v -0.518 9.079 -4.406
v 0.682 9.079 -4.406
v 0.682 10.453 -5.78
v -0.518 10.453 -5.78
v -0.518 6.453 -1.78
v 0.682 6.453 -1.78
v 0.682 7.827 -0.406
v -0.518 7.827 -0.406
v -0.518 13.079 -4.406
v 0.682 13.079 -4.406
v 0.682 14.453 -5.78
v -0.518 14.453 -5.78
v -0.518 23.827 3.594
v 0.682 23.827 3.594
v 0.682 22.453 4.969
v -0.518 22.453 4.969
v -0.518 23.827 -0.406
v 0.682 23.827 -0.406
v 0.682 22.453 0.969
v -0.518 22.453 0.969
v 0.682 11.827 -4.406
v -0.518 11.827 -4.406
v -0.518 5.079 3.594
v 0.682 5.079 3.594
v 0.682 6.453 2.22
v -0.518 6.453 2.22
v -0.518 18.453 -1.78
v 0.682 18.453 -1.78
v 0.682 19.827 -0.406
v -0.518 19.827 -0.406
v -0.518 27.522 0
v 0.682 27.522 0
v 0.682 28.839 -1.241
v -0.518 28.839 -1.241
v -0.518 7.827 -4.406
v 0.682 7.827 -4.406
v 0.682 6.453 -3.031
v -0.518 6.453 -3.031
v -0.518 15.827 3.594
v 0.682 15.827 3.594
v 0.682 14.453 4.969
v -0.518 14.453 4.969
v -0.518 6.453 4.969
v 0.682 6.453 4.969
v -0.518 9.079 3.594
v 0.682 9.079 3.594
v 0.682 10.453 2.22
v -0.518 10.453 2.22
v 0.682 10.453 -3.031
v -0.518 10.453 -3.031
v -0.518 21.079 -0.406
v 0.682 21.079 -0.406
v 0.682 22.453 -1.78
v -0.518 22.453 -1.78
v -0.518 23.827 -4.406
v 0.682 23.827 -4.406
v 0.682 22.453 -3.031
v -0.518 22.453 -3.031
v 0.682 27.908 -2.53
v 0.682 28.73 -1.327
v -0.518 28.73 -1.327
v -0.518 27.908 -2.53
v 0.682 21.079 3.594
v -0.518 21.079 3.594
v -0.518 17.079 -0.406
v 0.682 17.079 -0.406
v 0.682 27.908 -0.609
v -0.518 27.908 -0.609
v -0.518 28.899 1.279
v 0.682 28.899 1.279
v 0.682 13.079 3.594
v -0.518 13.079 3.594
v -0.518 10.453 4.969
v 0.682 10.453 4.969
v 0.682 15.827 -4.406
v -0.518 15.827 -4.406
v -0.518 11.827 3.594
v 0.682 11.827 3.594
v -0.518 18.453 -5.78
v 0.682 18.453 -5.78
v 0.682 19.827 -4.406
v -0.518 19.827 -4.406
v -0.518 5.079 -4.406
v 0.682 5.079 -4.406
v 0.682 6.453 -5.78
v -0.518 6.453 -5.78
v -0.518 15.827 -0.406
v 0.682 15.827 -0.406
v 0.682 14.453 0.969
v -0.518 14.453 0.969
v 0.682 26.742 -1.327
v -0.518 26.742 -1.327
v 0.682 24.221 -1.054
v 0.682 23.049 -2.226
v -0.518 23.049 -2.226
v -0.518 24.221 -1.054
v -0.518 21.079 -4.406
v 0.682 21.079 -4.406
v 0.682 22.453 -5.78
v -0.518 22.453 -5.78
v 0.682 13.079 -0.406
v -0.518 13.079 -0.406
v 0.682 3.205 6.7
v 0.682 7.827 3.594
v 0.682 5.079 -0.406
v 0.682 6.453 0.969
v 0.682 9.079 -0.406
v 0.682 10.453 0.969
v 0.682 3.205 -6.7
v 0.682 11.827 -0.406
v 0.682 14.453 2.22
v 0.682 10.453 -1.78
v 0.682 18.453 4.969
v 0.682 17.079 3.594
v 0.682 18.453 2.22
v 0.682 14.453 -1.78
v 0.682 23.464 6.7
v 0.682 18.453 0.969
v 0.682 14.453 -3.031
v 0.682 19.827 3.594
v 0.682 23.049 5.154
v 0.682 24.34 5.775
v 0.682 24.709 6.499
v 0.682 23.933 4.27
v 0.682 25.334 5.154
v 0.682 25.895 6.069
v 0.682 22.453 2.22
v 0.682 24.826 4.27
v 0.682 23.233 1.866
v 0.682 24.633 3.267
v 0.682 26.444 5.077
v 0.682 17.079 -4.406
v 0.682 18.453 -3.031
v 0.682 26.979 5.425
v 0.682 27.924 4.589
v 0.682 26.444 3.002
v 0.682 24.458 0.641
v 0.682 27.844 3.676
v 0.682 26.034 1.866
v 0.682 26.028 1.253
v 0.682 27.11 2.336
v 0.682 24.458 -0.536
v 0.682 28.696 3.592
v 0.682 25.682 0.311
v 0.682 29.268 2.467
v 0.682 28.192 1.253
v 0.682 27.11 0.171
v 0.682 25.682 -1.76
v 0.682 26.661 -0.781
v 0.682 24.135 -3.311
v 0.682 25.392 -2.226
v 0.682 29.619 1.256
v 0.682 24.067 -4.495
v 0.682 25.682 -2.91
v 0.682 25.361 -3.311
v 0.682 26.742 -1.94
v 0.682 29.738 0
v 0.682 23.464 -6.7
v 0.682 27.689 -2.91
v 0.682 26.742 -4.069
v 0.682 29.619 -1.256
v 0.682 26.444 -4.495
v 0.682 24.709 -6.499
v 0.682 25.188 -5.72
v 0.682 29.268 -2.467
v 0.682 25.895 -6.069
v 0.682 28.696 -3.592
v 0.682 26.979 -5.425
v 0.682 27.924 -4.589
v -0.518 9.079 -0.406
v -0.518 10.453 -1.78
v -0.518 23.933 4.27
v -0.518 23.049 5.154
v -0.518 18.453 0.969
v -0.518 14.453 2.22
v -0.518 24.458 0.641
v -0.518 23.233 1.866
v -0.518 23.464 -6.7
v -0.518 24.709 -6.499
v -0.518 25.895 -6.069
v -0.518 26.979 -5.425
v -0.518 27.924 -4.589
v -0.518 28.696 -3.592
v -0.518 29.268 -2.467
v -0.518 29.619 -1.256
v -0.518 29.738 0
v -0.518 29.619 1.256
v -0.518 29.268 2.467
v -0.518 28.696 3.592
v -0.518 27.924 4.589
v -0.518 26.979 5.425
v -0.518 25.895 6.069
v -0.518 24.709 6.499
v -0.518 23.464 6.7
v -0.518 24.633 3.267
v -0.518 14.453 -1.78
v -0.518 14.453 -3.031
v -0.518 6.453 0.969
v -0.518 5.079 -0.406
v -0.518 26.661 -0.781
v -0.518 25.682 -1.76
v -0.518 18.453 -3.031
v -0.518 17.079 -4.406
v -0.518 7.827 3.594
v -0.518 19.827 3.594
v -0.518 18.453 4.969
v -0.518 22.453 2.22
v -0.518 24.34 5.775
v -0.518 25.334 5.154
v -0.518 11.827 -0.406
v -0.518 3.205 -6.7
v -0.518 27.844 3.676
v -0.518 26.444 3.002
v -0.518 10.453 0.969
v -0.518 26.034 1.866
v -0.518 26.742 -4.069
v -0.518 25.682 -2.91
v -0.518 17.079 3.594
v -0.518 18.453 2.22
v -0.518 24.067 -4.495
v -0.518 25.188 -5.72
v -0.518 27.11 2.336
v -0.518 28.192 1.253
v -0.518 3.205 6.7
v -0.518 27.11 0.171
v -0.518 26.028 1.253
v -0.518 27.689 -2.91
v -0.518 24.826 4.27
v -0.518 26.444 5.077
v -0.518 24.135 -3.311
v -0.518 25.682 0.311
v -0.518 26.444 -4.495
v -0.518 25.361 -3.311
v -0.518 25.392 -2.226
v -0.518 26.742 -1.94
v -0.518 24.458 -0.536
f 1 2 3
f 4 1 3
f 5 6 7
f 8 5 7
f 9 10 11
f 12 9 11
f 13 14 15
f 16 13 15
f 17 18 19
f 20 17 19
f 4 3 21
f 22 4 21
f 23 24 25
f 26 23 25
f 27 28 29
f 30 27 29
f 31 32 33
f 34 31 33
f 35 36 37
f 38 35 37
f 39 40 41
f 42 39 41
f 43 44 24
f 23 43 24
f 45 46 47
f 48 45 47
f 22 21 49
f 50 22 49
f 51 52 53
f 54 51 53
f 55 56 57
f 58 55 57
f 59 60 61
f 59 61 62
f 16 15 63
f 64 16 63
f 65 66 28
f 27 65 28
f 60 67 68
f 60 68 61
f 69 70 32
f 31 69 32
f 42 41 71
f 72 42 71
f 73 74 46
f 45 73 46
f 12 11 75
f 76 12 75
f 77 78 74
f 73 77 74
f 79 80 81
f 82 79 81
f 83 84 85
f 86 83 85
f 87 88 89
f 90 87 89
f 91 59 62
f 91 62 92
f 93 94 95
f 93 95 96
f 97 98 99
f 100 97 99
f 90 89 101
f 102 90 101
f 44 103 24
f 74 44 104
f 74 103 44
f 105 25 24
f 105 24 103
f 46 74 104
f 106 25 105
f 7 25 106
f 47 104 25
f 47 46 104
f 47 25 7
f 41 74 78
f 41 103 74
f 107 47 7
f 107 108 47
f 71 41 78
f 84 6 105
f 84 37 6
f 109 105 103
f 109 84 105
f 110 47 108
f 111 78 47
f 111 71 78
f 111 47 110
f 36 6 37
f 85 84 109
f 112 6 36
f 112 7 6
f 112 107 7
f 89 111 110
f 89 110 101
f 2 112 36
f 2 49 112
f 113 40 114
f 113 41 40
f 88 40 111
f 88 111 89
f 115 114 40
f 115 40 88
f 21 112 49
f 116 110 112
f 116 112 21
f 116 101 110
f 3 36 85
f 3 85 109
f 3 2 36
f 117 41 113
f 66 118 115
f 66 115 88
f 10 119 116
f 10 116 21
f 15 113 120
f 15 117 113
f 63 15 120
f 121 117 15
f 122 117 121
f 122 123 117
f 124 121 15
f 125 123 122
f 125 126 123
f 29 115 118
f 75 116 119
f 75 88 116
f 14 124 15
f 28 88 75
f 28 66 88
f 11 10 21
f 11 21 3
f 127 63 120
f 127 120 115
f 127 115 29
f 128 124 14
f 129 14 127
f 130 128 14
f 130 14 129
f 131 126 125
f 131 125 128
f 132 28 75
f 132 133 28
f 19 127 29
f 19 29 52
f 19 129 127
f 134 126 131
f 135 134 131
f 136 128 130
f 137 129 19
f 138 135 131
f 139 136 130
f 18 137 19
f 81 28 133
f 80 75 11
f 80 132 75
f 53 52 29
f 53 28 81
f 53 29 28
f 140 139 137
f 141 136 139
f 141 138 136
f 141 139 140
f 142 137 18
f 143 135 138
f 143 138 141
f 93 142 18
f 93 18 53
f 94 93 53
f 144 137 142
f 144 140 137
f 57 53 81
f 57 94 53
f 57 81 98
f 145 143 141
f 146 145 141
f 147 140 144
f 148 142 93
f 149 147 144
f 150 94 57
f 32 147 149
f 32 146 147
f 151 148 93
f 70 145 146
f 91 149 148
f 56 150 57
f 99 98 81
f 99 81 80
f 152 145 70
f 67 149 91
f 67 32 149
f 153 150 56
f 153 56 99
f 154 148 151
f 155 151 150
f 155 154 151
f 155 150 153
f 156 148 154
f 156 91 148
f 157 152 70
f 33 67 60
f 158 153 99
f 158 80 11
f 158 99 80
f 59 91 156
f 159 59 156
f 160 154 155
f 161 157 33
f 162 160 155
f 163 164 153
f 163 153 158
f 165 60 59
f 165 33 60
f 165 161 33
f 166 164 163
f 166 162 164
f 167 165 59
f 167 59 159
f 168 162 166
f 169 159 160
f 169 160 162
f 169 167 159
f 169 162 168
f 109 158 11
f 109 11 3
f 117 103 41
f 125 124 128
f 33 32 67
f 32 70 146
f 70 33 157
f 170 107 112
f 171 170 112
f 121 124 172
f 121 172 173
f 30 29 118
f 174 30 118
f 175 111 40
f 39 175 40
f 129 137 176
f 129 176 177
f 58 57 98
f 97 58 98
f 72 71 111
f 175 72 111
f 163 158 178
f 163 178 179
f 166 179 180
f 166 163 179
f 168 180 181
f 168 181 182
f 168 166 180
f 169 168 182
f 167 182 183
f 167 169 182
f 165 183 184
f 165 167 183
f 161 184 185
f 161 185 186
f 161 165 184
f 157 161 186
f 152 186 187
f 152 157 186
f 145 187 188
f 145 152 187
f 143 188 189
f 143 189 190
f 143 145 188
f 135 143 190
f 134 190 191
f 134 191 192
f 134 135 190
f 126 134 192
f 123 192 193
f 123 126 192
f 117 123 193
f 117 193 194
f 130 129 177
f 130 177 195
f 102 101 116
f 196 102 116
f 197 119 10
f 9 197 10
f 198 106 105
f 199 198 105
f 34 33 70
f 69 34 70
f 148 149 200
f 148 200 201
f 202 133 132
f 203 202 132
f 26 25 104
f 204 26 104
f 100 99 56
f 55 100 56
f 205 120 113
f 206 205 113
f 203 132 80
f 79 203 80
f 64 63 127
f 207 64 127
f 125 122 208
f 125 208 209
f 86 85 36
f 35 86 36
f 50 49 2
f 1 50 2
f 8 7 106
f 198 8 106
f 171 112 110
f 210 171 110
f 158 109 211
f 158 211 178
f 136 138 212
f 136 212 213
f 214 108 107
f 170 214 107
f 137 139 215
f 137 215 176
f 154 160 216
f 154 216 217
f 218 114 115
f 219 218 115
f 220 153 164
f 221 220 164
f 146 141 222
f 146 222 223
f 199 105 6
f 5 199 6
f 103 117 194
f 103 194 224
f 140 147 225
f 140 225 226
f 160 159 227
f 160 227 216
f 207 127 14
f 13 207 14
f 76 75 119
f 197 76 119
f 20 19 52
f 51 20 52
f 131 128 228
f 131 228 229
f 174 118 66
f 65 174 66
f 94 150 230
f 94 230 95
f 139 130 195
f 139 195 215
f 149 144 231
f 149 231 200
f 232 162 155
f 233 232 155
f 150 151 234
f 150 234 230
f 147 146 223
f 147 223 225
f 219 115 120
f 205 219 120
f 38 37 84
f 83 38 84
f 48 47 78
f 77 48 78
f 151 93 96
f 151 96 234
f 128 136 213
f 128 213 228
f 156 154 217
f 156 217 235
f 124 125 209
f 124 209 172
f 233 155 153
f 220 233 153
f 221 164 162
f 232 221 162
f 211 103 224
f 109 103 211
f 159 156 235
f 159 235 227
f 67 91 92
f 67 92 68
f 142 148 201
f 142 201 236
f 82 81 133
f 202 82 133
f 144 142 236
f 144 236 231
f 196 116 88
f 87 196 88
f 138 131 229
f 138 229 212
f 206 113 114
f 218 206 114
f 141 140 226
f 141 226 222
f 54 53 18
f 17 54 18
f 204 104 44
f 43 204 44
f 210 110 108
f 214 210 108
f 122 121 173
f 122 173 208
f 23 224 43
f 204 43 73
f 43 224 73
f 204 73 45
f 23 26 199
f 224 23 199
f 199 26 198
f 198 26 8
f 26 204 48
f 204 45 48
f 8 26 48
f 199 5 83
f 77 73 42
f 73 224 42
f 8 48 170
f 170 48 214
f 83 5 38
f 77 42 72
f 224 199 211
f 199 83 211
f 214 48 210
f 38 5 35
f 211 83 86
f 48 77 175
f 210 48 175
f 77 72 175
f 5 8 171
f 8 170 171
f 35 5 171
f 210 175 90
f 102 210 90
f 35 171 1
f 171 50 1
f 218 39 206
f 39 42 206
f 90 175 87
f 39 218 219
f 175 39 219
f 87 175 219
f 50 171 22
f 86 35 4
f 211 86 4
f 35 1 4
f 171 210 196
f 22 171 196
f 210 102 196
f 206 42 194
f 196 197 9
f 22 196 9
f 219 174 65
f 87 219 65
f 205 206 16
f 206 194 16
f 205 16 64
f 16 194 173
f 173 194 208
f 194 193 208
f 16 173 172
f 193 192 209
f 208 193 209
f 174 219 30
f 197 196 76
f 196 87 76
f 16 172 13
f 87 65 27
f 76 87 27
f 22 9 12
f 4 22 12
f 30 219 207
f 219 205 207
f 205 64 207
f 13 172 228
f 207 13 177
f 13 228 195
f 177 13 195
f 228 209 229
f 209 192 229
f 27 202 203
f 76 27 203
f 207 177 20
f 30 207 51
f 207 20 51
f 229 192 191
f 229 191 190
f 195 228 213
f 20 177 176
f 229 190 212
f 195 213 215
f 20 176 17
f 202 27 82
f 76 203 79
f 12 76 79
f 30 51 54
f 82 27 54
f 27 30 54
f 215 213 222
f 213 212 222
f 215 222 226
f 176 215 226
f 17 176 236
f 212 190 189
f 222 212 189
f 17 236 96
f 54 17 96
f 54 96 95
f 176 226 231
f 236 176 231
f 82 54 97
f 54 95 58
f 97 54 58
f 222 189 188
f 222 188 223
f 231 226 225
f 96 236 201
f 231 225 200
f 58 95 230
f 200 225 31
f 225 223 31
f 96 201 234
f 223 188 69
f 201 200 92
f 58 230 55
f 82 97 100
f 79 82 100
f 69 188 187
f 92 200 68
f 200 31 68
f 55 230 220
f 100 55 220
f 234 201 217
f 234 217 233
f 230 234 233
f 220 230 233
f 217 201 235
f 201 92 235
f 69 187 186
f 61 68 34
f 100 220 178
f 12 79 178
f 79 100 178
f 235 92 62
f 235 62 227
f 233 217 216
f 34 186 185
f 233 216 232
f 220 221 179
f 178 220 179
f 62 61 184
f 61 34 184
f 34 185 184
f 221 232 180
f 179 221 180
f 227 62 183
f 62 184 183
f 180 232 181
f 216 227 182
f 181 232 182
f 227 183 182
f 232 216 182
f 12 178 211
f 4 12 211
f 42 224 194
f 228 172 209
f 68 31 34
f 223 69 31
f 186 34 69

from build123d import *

# Parameters (mm, degrees)
MAINBASESKETCH_W                 = 7.9
MAINBASESKETCH_H                 = 3.2
MAINBASEEXTRUDE_DEPTH            = 7.9
MAINBASESHELL_T                  = -1.2
SLIMYELLOWUNDEREXT_START         = -0.2
SLIMYELLOWUNDEREXT_DEPTH         = 2
SLIMYELLLOWUPPERCIRCLESKETCH_R   = 2.45
SLIMYELLLOWUPPERCIRCLESKETCH_R_2 = 2
SLIMYELLOWUPPERCIRCLE_DEPTH      = 1.6
MOVE_START                       = 3.2
MOVE_FACE2_OUTLINE_W             = 7.9
MOVE_FACE2_OUTLINE_H             = 15.8
MOVE_FACE2_OUTLINE_R             = 2
MOVE_FACE2_DEPTH                 = 27.8
MOVE_START_2                     = 31
MOVE_FACE2_2_OUTLINE_R           = 2.45
MOVE_FACE2_2_OUTLINE_R_2         = 2
MOVE_FACE2_2_DEPTH               = 1.6
FILLET25_R                       = 7.6
FILLET26_R                       = 7.6
CUT_EXTRUDE55_DEPTH              = 35.461282763
CUT_EXTRUDE57_REACH              = 34.748
SKETCH160_R                      = 0.75
BOSS_EXTRUDE20_DEPTH             = 3.5
BOSS_EXTRUDE22_DEPTH             = 1.2
CUT_EXTRUDE58_DEPTH              = 35.461282763
CUT_EXTRUDE59_DEPTH              = 31.506685799
CUT_EXTRUDE61_DEPTH              = 31.506685799
LPATTERN5_COUNT                  = 5
LPATTERN5_PITCH                  = 4
LPATTERN5_COUNT_DIR2             = 3
LPATTERN5_PITCH_DIR2             = 4
CUT_EXTRUDE62_DEPTH              = 31.506685799


# Read off the part's stored shape, not the designer's step: Move Face2
with BuildPart() as part:
    # MainBaseSketch → MainBaseExtrude (new, symmetric)
    with BuildSketch(Plane.XY):
        with Locations((4.631967213, 1.6)):
            Rectangle(MAINBASESKETCH_W, MAINBASESKETCH_H)
    extrude(amount=MAINBASEEXTRUDE_DEPTH, both=True)

    # MainBaseShell
    mainbaseshell_openings = [part.faces().sort_by_distance(p)[0] for p in [
        (4.631967213, 0, 0),
    ]]
    offset(amount=MAINBASESHELL_T, openings=mainbaseshell_openings, kind=Kind.INTERSECTION)

    # SlimYellowUnderExtSketch → SlimYellowUnderExt (add)
    with BuildSketch(Plane.XZ.offset(-2).offset(SLIMYELLOWUNDEREXT_START)):
        Polygon((1.881967213, 1.952811318), (1.881967213, 2.947188682), (2.384104441, 2.947188682), (2.882626102, 2.45), (2.384104441, 1.952811318), align=None)
        Polygon((6.381308324, 2.45), (6.879829986, 2.947188682), (7.381967213, 2.947188682), (7.381967213, 1.952811318), (6.879829986, 1.952811318), align=None)
        Polygon((1.881967213, -1.952811318), (2.384104441, -1.952811318), (2.882626102, -2.45), (2.384104441, -2.947188682), (1.881967213, -2.947188682), align=None)
        Polygon((7.381967213, -1.952811318), (7.381967213, -2.947188682), (6.879829986, -2.947188682), (6.381308324, -2.45), (6.879829986, -1.952811318), align=None)
    extrude(amount=SLIMYELLOWUNDEREXT_DEPTH)

    # SlimYelllowUpperCircleSketch → SlimYellowUpperCircle (add)
    with BuildSketch(Plane(origin=(0, 3.2, 0), x_dir=(1, 0, 0), z_dir=(0, 1, 0))):
        with Locations((4.647335619, 0)):
            Circle(SLIMYELLLOWUPPERCIRCLESKETCH_R)
        with Locations(Location((4.647335619, 0, 0), (0, 0, 270))):
            Circle(SLIMYELLLOWUPPERCIRCLESKETCH_R_2, mode=Mode.SUBTRACT)
    extrude(amount=SLIMYELLOWUPPERCIRCLE_DEPTH)

    # Move Face2 outline → Move Face2 (add)
    with BuildSketch(Plane(origin=(0, 0, 0), x_dir=(1, 0, 0), z_dir=(0, 1, 0)).offset(MOVE_START)):
        with Locations((4.631967213, 0)):
            Rectangle(MOVE_FACE2_OUTLINE_W, MOVE_FACE2_OUTLINE_H)
        with Locations((4.647335619, 0)):
            Circle(MOVE_FACE2_OUTLINE_R, mode=Mode.SUBTRACT)
    extrude(amount=MOVE_FACE2_DEPTH)

    # Move Face2 2 outline → Move Face2 2 (add)
    with BuildSketch(Plane(origin=(0, 0, 0), x_dir=(1, 0, 0), z_dir=(0, 1, 0)).offset(MOVE_START_2)):
        with Locations((4.647335619, 0)):
            Circle(MOVE_FACE2_2_OUTLINE_R)
        with Locations((4.647335619, 0)):
            Circle(MOVE_FACE2_2_OUTLINE_R_2, mode=Mode.SUBTRACT)
    extrude(amount=MOVE_FACE2_2_DEPTH)

    # Fillet25
    # the kernel refuses this fillet: 7.6 mm, written as the material it takes off along each edge
    with BuildSketch(Plane(origin=(0.681967213, 31, 7.9), x_dir=(0, 0, -1), z_dir=(1, 0, 0))) as fillet25_piece_1_section:
        with BuildLine():
            CenterArc((FILLET25_R, -FILLET25_R), FILLET25_R, 90, 90)
            Line((0, -FILLET25_R), (-FILLET25_R * 0.02, -FILLET25_R))
            Line((-FILLET25_R * 0.02, -FILLET25_R), (-FILLET25_R * 0.02, FILLET25_R * 0.02))
            Line((-FILLET25_R * 0.02, FILLET25_R * 0.02), (FILLET25_R, FILLET25_R * 0.02))
            Line((FILLET25_R, FILLET25_R * 0.02), (FILLET25_R, 0))
        make_face()
    fillet25_piece_1 = extrude(amount=7.9, mode=Mode.PRIVATE)
    fillet25_piece_1 = fillet25_piece_1 - Plane(origin=(4.647335619, 29.251763141, 0), x_dir=(1, 0, 0), z_dir=(0, -1, 0)) * Cylinder(2.45, 47, mode=Mode.PRIVATE)
    add(fillet25_piece_1, mode=Mode.SUBTRACT)

    # Fillet26
    # the kernel refuses this fillet: 7.6 mm, written as the material it takes off along each edge
    with BuildSketch(Plane(origin=(27.581967213, 31, -7.9), x_dir=(0, 0, 1), z_dir=(-1, 0, 0))) as fillet26_piece_1_section:
        with BuildLine():
            CenterArc((FILLET26_R, -FILLET26_R), FILLET26_R, 90, 90)
            Line((0, -FILLET26_R), (0, 0))
            Line((0, 0), (FILLET26_R, 0))
        make_face()
    fillet26_piece_1 = extrude(amount=45.9, mode=Mode.PRIVATE)
    fillet26_piece_1 = fillet26_piece_1 - Plane(origin=(4.647335619, 29.29236393, 0), x_dir=(1, 0, 0), z_dir=(0, -1, 0)) * Cylinder(2.45, 123, mode=Mode.PRIVATE)
    add(fillet26_piece_1, mode=Mode.SUBTRACT)

    # Sketch159 → Cut-Extrude55 (cut, through all)
    with BuildSketch(Plane(origin=(8.581967213, 0, 0), x_dir=(0, 0, -1), z_dir=(1, 0, 0))):
        with BuildLine():
            Line((6.7, 3.204620212), (6.7, 23.463811934))
            ThreePointArc((6.7, 23.463811934), (0, 29.737650856), (-6.7, 23.463811934))
            Line((-6.7, 23.463811934), (-6.7, 3.204620212))
            Line((-6.7, 3.204620212), (6.7, 3.204620212))
        make_face()
    extrude(amount=-CUT_EXTRUDE55_DEPTH, mode=Mode.SUBTRACT)

    # Sketch160 → Cut-Extrude57 (cut, up to next)
    with BuildSketch(Plane(origin=(0, 2, 0), x_dir=(-1, 0, 0), z_dir=(0, -1, 0)), mode=Mode.PRIVATE) as cut_extrude57_sk1:
        with Locations(Location((-6.381967213, 0, 0), (0, 0, 180))):
            Circle(SKETCH160_R)
    cut_extrude57_tool1 = extrude(cut_extrude57_sk1.sketch, amount=-CUT_EXTRUDE57_REACH, mode=Mode.PRIVATE) & part.part
    # Sketch160 → Cut-Extrude57 (cut, up to next)
    with BuildSketch(Plane(origin=(0, 2, 0), x_dir=(-1, 0, 0), z_dir=(0, -1, 0)), mode=Mode.PRIVATE) as cut_extrude57_sk2:
        with Locations(Location((-2.881967213, 0, 0), (0, 0, 180))):
            Circle(SKETCH160_R)
    cut_extrude57_tool2 = extrude(cut_extrude57_sk2.sketch, amount=-CUT_EXTRUDE57_REACH, mode=Mode.PRIVATE) & part.part
    add(cut_extrude57_tool1.solids().sort_by_distance((6.381967, 2, 0))[0], mode=Mode.SUBTRACT)
    add(cut_extrude57_tool2.solids().sort_by_distance((2.881967, 2, 0))[0], mode=Mode.SUBTRACT)

    # Sketch161 → Boss-Extrude20 (add, symmetric)
    with BuildSketch(Plane(origin=(4.631967213, 0, 0), x_dir=(0, 0, -1), z_dir=(1, 0, 0))):
        with BuildLine():
            Line((2.455062292, 30.688052313), (2.455062292, 30.469179439))
            Line((2.455062292, 30.469179439), (2.455062292, 29.272723248))
            ThreePointArc((2.455062292, 29.272723248), (0, 29.737650856), (-2.455062292, 29.272723248))
            Line((-2.455062292, 29.272723248), (-2.455062292, 30.526922148))
            Line((-2.455062292, 30.526922148), (-2.455062292, 30.688052313))
            ThreePointArc((-2.455062292, 30.688052313), (0, 31.033009473), (2.455062292, 30.688052313))
        make_face()
    extrude(amount=BOSS_EXTRUDE20_DEPTH, both=True)

    # Sketch163 → Cut-Extrude58 (cut, through all)
    with BuildSketch(Plane.ZY.offset(-0.681967213)):
        with BuildLine():
            Line((-7.9, 23.4), (-7.9, 0))
            Line((-7.9, 0), (7.9, 0))
            Line((7.9, 0), (7.9, 23.4))
            ThreePointArc((7.9, 23.4), (6.393942446, 28.039773701), (2.45, 30.91049266))
            Line((2.45, 30.91049266), (2.514245173, 32.885555996))
            Line((2.514245173, 32.885555996), (-2.45, 32.885555996))
            Line((-2.45, 32.885555996), (-2.45, 30.91049266))
            ThreePointArc((-2.45, 30.91049266), (-6.393942446, 28.039773701), (-7.9, 23.4))
        make_face()
        with BuildLine():
            Line((6.7, 23.463811934), (6.7, 3.204620212))
            Line((6.7, 3.204620212), (-6.7, 3.204620212))
            Line((-6.7, 3.204620212), (-6.7, 23.463811934))
            ThreePointArc((-6.7, 23.463811934), (0, 29.737650856), (6.7, 23.463811934))
        make_face(mode=Mode.SUBTRACT)
    extrude(amount=-CUT_EXTRUDE58_DEPTH, mode=Mode.SUBTRACT)


with BuildPart() as body_2:
    # Sketch162 → Boss-Extrude22 (new body)
    with BuildSketch(Plane.ZY.offset(-0.681967213)):
        with BuildLine():
            Line((-6.7, 3.204620212), (-6.7, 23.463811934))
            ThreePointArc((-6.7, 23.463811934), (0, 29.737650856), (6.7, 23.463811934))
            Line((6.7, 23.463811934), (6.7, 3.204620212))
            Line((6.7, 3.204620212), (-6.7, 3.204620212))
        make_face()
    extrude(amount=BOSS_EXTRUDE22_DEPTH)

    # Sketch164 → Cut-Extrude59 (cut, through all)
    with BuildSketch(Plane.ZY.offset(-0.681967213)):
        Polygon((0, 27.521885921), (-1.241361972, 28.838648646), (1.278746144, 28.898801022), align=None)
    extrude(amount=CUT_EXTRUDE59_DEPTH, mode=Mode.SUBTRACT)

    # Sketch165 → Cut-Extrude61 (cut, through all)
    with BuildSketch(Plane.ZY.offset(-0.681967213)):
        Polygon((-4.405546645, 23.827298552), (-3.03141738, 22.453169286), (-4.405546645, 21.079040021), (-5.779675911, 22.453169286), align=None)
    cut_extrude61 = extrude(amount=CUT_EXTRUDE61_DEPTH, mode=Mode.SUBTRACT)

    # LPattern5: Cut-Extrude61 5 × 3
    with Locations(*[(0, -i * LPATTERN5_PITCH, j * LPATTERN5_PITCH_DIR2) for i in range(LPATTERN5_COUNT) for j in range(LPATTERN5_COUNT_DIR2) if (i, j) != (0, 0)]):
        add(cut_extrude61, mode=Mode.SUBTRACT)

    # Sketch166 → Cut-Extrude62 (cut, through all)
    with BuildSketch(Plane.ZY.offset(-0.681967213)):
        Polygon((-4.494877975, 24.067352963), (-5.720341085, 25.188203369), (-4.494877975, 26.443555824), (-3.311490851, 25.361189552), align=None)
        Polygon((-4.06895482, 26.742449265), (-2.909533146, 25.682002612), (-1.939612427, 26.742449265), (-2.909533146, 27.689276634), align=None)
        Polygon((-2.529653596, 27.908133687), (-1.326607494, 26.742449265), (-0.609263234, 27.908133687), (-1.326607494, 28.730090652), align=None)
        Polygon((-3.311490851, 24.134603988), (-2.225644972, 23.048758109), (-1.053867228, 24.220535852), (-2.225644972, 25.392313595), align=None)
        Polygon((-1.760283975, 25.682002612), (-0.536126237, 24.457844874), (0.311285226, 25.682002612), (-0.781045381, 26.661241207), align=None)
        Polygon((0.640575983, 24.457844874), (1.865804986, 23.232615872), (3.266618207, 24.633429093), (1.865804986, 26.034242315), align=None)
        Polygon((0.170877374, 27.11002176), (1.253190484, 26.027708649), (2.335503595, 27.11002176), (1.253190484, 28.19233487), align=None)
        Polygon((3.001969531, 26.443555824), (4.270065236, 24.825578524), (5.076744937, 26.443555824), (3.675931716, 27.844369045), align=None)
        Polygon((4.270065236, 23.933022483), (5.15432961, 23.048758109), (5.775380406, 24.339596358), (5.15432961, 25.333835704), align=None)
    extrude(amount=CUT_EXTRUDE62_DEPTH, mode=Mode.SUBTRACT)


solid = body_2.part
